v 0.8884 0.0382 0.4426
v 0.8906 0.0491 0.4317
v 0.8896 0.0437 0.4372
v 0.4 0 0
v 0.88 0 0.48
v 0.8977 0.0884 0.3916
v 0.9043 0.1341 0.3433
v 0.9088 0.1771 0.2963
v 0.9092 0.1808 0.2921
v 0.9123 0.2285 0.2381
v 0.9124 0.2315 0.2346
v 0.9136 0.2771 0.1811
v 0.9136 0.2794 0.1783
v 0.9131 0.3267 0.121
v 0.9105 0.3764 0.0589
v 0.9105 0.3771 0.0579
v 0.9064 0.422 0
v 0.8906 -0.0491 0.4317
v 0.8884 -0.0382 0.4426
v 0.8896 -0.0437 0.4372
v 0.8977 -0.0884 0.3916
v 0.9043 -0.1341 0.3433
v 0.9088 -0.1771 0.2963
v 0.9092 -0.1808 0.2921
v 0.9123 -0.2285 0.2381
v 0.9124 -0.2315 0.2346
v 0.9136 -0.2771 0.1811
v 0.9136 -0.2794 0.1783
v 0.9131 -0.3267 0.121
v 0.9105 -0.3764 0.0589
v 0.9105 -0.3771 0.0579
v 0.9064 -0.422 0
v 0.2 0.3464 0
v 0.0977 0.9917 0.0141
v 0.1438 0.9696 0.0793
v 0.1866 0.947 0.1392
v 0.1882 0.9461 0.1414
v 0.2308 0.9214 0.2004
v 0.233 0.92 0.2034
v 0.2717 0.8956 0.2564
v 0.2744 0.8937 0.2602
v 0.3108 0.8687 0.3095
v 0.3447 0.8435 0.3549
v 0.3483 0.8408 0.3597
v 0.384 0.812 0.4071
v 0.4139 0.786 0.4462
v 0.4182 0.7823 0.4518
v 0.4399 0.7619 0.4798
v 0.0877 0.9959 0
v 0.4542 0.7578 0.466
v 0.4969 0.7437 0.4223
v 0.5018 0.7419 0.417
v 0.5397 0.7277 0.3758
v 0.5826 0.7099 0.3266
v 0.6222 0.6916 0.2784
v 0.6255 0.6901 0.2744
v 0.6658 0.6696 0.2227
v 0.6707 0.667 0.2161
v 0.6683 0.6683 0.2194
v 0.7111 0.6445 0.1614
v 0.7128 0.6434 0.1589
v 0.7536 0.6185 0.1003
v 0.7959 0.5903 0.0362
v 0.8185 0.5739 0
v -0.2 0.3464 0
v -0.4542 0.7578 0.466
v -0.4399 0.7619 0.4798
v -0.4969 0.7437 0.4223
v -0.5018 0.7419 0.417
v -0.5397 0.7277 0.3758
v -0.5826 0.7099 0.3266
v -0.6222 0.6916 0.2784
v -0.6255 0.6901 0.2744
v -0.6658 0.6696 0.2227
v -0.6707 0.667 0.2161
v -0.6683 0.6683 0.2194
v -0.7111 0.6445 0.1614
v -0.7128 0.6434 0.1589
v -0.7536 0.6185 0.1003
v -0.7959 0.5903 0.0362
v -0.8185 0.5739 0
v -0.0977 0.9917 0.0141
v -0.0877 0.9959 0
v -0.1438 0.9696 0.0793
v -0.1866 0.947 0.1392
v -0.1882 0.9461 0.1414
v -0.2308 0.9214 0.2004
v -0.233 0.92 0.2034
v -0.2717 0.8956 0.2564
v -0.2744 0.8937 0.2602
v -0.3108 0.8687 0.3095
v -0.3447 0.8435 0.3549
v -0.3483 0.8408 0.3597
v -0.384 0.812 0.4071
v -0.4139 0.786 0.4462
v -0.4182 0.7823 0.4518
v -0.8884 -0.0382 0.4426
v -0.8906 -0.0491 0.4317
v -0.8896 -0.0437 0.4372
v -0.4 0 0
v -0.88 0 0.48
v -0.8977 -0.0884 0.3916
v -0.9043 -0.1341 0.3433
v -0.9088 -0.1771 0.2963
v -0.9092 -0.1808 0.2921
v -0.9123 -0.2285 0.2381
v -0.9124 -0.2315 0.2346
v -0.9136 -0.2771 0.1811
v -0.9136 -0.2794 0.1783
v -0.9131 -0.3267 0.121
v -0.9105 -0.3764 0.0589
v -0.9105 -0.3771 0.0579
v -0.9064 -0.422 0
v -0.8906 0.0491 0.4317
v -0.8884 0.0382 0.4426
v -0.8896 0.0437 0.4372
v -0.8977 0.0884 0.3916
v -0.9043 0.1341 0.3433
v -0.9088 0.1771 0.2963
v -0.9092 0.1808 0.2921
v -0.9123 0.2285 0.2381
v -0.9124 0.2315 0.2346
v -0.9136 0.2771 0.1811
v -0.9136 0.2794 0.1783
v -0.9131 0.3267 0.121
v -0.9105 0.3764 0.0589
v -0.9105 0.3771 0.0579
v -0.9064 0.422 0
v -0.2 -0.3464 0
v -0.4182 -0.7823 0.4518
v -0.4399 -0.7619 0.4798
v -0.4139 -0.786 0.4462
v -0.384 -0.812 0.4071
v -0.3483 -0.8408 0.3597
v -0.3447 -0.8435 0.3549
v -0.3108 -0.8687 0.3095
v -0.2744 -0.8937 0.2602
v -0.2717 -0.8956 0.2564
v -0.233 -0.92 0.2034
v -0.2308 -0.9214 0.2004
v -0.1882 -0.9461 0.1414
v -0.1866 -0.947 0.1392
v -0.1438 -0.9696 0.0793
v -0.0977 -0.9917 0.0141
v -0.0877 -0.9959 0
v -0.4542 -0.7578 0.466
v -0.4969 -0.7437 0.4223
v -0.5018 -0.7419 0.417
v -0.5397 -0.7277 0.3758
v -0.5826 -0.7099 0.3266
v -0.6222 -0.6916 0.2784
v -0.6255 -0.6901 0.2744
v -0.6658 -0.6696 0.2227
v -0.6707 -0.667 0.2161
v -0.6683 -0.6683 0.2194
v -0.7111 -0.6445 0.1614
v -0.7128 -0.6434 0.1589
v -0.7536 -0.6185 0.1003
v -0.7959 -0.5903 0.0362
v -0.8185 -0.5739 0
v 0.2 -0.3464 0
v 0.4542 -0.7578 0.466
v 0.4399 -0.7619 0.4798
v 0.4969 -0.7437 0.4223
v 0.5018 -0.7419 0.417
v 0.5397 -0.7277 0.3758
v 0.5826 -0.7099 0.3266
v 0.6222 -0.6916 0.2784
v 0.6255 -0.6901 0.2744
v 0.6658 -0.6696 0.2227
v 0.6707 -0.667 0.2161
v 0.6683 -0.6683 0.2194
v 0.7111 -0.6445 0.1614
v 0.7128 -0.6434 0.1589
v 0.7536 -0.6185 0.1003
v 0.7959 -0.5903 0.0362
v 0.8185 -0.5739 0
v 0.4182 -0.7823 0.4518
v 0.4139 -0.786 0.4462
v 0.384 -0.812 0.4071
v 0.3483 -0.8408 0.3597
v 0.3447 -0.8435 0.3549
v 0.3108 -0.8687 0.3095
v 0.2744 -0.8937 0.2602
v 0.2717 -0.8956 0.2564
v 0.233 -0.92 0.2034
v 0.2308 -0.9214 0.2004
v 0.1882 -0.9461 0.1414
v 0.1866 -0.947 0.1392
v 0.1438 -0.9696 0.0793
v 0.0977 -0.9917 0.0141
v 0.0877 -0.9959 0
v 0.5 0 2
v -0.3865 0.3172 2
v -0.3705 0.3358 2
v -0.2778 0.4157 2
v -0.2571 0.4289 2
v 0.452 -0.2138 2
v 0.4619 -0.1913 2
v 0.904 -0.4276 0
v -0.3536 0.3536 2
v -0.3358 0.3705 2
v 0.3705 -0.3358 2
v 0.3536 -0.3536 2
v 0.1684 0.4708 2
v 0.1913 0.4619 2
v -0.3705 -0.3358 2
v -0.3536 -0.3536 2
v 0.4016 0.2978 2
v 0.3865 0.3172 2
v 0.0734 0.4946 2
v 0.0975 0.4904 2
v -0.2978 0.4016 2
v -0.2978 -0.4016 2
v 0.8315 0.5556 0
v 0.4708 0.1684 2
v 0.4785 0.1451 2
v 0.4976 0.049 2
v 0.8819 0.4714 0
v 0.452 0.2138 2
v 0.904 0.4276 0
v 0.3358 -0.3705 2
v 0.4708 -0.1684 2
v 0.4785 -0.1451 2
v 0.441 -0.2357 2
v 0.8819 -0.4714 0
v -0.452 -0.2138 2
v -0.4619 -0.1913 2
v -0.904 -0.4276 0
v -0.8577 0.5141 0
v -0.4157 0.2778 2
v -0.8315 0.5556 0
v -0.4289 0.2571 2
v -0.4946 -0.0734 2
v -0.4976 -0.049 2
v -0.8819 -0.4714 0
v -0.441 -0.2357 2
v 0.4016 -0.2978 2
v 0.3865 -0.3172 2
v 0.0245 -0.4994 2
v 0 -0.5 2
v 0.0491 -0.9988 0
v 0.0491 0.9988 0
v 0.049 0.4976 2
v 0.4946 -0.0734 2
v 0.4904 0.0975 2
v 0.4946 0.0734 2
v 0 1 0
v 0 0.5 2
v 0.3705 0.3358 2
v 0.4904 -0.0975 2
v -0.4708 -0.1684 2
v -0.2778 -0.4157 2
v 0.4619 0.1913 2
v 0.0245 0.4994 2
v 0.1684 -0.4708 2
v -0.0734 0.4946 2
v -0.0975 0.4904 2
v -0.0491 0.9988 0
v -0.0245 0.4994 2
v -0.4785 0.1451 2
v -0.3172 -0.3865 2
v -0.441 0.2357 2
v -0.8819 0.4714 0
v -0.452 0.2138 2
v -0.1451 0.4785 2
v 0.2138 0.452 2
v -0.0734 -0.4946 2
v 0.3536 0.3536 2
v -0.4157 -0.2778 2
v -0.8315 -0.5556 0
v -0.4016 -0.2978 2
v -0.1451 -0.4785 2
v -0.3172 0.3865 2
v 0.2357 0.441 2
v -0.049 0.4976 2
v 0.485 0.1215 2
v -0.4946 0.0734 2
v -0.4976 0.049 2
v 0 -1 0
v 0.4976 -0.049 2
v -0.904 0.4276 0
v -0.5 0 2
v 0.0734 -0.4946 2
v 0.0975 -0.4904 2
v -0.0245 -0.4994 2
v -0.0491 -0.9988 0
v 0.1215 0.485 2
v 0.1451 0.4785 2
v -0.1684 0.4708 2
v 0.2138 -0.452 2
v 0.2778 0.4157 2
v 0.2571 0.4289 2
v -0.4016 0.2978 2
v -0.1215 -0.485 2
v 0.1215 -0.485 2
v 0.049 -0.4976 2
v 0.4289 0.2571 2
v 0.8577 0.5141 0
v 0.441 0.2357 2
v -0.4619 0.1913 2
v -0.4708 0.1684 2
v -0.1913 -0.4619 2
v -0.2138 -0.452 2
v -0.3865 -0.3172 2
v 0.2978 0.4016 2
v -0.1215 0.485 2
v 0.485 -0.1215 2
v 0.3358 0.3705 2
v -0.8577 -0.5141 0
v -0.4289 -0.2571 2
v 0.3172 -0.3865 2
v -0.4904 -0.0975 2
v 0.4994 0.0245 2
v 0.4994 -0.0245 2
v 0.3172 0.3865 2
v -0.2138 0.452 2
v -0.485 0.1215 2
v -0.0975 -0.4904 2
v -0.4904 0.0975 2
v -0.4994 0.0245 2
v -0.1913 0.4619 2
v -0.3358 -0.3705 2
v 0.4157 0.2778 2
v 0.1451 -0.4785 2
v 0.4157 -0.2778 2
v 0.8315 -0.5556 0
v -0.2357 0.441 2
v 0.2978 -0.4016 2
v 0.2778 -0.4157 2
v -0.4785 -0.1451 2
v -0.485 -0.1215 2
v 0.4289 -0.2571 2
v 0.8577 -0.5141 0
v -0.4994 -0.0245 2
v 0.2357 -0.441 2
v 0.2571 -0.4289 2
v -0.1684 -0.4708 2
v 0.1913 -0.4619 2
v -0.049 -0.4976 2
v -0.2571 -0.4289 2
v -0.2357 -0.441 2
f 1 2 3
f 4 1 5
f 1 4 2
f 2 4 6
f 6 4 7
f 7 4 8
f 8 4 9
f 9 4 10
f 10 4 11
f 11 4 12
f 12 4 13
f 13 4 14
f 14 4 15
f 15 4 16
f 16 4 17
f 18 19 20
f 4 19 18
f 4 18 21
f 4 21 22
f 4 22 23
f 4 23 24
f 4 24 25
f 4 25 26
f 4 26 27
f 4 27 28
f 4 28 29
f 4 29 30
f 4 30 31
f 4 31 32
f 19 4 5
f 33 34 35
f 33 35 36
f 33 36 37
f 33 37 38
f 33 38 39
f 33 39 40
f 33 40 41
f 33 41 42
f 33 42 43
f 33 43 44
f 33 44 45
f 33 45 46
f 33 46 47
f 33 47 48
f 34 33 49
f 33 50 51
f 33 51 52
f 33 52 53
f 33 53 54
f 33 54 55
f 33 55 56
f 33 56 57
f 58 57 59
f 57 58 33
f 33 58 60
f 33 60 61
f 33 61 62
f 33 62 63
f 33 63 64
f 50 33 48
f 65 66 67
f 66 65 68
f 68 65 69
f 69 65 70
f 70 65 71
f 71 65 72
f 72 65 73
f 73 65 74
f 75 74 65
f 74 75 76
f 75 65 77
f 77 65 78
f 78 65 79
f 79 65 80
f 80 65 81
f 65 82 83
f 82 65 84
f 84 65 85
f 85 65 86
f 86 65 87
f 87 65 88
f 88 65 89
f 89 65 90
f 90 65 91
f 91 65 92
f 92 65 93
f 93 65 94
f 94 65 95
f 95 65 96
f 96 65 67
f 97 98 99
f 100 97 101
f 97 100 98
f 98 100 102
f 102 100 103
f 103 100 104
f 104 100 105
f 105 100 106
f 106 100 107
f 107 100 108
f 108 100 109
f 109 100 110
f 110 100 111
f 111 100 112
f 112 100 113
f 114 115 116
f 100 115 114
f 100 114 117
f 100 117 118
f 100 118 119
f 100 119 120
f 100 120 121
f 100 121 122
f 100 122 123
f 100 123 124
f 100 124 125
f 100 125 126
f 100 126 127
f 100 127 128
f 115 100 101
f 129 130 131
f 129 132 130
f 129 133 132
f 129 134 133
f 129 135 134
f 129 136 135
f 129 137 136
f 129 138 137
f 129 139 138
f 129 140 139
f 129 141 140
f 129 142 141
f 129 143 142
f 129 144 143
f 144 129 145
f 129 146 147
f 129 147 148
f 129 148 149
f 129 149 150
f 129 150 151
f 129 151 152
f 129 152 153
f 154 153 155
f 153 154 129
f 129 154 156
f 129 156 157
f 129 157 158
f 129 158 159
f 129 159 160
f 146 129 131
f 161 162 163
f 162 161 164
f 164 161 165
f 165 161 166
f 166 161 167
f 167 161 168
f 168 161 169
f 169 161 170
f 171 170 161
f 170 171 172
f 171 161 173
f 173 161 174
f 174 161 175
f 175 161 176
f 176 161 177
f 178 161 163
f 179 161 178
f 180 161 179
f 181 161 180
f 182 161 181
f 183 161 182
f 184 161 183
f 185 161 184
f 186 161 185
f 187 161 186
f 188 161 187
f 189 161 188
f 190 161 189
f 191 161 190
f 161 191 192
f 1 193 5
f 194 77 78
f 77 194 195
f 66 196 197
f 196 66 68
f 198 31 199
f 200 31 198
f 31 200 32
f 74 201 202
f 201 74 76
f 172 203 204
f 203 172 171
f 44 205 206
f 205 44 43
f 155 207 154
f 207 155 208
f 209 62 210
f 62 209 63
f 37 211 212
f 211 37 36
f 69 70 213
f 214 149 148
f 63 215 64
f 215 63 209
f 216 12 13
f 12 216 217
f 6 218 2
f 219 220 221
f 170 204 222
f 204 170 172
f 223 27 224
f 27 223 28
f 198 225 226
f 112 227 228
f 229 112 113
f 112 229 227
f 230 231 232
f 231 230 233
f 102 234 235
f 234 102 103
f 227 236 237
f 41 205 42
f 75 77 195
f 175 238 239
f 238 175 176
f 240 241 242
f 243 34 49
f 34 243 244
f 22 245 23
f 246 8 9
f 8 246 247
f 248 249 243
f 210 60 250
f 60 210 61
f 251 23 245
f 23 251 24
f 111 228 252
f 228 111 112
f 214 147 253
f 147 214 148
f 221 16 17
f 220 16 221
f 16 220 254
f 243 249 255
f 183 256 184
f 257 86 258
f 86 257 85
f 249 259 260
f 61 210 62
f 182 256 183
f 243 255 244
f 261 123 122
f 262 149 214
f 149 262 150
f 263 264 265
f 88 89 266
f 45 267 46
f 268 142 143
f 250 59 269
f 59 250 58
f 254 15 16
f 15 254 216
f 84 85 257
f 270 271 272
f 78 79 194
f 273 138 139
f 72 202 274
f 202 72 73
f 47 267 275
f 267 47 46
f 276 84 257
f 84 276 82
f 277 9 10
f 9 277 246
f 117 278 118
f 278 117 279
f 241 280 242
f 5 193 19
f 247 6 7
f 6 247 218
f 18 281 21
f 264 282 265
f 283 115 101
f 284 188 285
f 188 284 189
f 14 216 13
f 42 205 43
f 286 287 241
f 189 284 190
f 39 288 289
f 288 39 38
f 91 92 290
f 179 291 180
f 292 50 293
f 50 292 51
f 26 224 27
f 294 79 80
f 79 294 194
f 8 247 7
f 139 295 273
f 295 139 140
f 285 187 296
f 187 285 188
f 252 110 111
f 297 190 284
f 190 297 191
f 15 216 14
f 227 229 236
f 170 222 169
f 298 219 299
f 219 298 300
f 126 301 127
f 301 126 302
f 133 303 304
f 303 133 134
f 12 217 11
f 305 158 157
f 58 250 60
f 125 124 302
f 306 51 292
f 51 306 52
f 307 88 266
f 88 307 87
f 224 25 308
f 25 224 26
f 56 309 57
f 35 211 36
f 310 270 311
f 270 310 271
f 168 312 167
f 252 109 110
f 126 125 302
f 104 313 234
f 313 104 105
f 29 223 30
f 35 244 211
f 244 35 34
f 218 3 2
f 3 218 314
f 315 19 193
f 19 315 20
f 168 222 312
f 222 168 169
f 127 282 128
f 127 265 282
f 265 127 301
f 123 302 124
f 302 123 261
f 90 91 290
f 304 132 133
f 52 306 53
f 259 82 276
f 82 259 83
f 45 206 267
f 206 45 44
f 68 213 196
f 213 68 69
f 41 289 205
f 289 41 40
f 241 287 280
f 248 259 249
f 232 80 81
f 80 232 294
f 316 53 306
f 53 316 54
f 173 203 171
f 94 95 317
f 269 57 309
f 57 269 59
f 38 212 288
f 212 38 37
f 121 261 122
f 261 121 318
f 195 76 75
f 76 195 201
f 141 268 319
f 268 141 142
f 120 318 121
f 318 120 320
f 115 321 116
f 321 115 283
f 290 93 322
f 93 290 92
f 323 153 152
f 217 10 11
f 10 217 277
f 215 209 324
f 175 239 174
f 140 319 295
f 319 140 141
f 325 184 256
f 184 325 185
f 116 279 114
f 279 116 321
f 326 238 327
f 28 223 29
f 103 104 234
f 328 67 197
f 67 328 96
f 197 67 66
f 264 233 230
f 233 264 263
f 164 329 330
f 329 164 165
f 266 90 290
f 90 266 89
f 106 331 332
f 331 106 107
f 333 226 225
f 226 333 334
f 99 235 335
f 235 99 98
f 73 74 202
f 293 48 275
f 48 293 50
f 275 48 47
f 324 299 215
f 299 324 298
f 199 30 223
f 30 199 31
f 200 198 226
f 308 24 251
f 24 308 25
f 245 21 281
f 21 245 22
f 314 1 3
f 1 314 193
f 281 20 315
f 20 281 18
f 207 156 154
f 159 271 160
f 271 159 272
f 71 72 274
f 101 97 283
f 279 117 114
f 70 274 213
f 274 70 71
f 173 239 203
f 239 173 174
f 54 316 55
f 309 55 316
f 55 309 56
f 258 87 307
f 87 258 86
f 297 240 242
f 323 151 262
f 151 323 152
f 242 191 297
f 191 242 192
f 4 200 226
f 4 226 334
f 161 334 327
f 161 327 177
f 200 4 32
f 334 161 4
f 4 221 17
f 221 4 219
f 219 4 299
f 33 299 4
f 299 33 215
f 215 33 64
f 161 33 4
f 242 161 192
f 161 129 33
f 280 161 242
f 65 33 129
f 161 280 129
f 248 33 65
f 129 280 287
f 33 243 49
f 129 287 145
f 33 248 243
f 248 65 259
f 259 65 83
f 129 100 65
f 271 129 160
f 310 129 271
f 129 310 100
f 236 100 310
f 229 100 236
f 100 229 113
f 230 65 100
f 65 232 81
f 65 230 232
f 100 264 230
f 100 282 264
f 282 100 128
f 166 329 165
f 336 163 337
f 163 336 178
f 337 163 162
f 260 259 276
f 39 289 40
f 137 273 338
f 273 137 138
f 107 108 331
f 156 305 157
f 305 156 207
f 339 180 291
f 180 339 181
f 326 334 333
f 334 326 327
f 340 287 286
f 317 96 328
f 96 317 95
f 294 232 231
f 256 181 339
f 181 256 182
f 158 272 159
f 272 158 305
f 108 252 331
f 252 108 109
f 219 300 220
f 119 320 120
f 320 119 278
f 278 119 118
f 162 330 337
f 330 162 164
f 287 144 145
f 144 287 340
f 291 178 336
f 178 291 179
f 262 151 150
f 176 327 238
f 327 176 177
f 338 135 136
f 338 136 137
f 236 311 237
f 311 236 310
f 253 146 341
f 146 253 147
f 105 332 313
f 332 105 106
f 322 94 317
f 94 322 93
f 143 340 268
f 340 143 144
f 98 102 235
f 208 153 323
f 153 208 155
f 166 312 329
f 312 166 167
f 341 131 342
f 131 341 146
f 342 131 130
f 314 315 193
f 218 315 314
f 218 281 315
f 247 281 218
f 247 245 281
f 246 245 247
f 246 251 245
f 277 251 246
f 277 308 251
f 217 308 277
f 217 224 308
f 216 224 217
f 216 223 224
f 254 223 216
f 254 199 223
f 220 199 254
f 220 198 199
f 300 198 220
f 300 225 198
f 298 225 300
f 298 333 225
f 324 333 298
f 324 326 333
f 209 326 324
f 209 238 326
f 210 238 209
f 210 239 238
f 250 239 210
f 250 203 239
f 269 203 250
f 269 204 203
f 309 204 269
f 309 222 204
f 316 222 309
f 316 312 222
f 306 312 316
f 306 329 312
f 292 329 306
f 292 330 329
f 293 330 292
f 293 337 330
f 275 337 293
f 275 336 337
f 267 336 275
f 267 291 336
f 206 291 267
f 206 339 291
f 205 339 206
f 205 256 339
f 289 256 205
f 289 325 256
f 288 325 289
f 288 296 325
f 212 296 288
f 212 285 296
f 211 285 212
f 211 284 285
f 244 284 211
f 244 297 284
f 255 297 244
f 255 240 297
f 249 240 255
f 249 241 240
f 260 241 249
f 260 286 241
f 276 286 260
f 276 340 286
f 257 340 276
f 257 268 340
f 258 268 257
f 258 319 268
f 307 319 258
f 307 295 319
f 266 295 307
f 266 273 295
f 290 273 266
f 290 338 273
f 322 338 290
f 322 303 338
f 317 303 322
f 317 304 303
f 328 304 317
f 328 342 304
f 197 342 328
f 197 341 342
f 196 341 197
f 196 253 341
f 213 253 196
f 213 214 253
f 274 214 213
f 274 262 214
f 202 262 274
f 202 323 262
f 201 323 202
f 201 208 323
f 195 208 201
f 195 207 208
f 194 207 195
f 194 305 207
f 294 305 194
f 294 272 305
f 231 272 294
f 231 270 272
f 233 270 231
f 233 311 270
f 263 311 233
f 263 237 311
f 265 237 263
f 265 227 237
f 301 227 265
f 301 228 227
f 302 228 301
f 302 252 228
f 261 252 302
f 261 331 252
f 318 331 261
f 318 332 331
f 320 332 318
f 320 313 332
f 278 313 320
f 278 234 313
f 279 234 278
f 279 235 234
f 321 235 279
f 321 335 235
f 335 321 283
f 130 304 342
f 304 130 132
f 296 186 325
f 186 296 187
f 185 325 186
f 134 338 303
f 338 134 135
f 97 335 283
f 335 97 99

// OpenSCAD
r=1;
n=12;
alpha=360/12;
f=sin(alpha)*r;
xtip=0.4;

echo(sin(alpha));

difference() {
    cylinder(r1=1, r2=0.5, h=2, center=false, $fn=128);
    for(angle=[0:n/2-1]){
        rotate([0,0,angle*alpha*2]) polyhedron(
            points=[
                [xtip,0,0], // [0] Nullpunkt
                [r,0,0],    // [1] Aussen Mitte
                [r-0.1,0,f],    // [2] Aussen Oben
                [r,f,0],    // [3] Aussen Rechts
                [r,-f,0],   // [4] Aussen Links
                [r+0.1,0,-f],   // [5] Aussen Unten
            ],
            triangles=[
                [0,3,2], // spitze rechts oben
                [1,2,3], // aussenflaeche rechts oben
                [0,2,4], // spitze links oben
                [1,4,2], // aussenflaeche links oben
                [0,4,5], // spitze links unten
                [1,3,5], // aussenflaeche rechts unten
                [0,5,3], // spitze rechts unten
                [1,5,4], // aussenflaeche links unten
            ]
        );
    }
}
